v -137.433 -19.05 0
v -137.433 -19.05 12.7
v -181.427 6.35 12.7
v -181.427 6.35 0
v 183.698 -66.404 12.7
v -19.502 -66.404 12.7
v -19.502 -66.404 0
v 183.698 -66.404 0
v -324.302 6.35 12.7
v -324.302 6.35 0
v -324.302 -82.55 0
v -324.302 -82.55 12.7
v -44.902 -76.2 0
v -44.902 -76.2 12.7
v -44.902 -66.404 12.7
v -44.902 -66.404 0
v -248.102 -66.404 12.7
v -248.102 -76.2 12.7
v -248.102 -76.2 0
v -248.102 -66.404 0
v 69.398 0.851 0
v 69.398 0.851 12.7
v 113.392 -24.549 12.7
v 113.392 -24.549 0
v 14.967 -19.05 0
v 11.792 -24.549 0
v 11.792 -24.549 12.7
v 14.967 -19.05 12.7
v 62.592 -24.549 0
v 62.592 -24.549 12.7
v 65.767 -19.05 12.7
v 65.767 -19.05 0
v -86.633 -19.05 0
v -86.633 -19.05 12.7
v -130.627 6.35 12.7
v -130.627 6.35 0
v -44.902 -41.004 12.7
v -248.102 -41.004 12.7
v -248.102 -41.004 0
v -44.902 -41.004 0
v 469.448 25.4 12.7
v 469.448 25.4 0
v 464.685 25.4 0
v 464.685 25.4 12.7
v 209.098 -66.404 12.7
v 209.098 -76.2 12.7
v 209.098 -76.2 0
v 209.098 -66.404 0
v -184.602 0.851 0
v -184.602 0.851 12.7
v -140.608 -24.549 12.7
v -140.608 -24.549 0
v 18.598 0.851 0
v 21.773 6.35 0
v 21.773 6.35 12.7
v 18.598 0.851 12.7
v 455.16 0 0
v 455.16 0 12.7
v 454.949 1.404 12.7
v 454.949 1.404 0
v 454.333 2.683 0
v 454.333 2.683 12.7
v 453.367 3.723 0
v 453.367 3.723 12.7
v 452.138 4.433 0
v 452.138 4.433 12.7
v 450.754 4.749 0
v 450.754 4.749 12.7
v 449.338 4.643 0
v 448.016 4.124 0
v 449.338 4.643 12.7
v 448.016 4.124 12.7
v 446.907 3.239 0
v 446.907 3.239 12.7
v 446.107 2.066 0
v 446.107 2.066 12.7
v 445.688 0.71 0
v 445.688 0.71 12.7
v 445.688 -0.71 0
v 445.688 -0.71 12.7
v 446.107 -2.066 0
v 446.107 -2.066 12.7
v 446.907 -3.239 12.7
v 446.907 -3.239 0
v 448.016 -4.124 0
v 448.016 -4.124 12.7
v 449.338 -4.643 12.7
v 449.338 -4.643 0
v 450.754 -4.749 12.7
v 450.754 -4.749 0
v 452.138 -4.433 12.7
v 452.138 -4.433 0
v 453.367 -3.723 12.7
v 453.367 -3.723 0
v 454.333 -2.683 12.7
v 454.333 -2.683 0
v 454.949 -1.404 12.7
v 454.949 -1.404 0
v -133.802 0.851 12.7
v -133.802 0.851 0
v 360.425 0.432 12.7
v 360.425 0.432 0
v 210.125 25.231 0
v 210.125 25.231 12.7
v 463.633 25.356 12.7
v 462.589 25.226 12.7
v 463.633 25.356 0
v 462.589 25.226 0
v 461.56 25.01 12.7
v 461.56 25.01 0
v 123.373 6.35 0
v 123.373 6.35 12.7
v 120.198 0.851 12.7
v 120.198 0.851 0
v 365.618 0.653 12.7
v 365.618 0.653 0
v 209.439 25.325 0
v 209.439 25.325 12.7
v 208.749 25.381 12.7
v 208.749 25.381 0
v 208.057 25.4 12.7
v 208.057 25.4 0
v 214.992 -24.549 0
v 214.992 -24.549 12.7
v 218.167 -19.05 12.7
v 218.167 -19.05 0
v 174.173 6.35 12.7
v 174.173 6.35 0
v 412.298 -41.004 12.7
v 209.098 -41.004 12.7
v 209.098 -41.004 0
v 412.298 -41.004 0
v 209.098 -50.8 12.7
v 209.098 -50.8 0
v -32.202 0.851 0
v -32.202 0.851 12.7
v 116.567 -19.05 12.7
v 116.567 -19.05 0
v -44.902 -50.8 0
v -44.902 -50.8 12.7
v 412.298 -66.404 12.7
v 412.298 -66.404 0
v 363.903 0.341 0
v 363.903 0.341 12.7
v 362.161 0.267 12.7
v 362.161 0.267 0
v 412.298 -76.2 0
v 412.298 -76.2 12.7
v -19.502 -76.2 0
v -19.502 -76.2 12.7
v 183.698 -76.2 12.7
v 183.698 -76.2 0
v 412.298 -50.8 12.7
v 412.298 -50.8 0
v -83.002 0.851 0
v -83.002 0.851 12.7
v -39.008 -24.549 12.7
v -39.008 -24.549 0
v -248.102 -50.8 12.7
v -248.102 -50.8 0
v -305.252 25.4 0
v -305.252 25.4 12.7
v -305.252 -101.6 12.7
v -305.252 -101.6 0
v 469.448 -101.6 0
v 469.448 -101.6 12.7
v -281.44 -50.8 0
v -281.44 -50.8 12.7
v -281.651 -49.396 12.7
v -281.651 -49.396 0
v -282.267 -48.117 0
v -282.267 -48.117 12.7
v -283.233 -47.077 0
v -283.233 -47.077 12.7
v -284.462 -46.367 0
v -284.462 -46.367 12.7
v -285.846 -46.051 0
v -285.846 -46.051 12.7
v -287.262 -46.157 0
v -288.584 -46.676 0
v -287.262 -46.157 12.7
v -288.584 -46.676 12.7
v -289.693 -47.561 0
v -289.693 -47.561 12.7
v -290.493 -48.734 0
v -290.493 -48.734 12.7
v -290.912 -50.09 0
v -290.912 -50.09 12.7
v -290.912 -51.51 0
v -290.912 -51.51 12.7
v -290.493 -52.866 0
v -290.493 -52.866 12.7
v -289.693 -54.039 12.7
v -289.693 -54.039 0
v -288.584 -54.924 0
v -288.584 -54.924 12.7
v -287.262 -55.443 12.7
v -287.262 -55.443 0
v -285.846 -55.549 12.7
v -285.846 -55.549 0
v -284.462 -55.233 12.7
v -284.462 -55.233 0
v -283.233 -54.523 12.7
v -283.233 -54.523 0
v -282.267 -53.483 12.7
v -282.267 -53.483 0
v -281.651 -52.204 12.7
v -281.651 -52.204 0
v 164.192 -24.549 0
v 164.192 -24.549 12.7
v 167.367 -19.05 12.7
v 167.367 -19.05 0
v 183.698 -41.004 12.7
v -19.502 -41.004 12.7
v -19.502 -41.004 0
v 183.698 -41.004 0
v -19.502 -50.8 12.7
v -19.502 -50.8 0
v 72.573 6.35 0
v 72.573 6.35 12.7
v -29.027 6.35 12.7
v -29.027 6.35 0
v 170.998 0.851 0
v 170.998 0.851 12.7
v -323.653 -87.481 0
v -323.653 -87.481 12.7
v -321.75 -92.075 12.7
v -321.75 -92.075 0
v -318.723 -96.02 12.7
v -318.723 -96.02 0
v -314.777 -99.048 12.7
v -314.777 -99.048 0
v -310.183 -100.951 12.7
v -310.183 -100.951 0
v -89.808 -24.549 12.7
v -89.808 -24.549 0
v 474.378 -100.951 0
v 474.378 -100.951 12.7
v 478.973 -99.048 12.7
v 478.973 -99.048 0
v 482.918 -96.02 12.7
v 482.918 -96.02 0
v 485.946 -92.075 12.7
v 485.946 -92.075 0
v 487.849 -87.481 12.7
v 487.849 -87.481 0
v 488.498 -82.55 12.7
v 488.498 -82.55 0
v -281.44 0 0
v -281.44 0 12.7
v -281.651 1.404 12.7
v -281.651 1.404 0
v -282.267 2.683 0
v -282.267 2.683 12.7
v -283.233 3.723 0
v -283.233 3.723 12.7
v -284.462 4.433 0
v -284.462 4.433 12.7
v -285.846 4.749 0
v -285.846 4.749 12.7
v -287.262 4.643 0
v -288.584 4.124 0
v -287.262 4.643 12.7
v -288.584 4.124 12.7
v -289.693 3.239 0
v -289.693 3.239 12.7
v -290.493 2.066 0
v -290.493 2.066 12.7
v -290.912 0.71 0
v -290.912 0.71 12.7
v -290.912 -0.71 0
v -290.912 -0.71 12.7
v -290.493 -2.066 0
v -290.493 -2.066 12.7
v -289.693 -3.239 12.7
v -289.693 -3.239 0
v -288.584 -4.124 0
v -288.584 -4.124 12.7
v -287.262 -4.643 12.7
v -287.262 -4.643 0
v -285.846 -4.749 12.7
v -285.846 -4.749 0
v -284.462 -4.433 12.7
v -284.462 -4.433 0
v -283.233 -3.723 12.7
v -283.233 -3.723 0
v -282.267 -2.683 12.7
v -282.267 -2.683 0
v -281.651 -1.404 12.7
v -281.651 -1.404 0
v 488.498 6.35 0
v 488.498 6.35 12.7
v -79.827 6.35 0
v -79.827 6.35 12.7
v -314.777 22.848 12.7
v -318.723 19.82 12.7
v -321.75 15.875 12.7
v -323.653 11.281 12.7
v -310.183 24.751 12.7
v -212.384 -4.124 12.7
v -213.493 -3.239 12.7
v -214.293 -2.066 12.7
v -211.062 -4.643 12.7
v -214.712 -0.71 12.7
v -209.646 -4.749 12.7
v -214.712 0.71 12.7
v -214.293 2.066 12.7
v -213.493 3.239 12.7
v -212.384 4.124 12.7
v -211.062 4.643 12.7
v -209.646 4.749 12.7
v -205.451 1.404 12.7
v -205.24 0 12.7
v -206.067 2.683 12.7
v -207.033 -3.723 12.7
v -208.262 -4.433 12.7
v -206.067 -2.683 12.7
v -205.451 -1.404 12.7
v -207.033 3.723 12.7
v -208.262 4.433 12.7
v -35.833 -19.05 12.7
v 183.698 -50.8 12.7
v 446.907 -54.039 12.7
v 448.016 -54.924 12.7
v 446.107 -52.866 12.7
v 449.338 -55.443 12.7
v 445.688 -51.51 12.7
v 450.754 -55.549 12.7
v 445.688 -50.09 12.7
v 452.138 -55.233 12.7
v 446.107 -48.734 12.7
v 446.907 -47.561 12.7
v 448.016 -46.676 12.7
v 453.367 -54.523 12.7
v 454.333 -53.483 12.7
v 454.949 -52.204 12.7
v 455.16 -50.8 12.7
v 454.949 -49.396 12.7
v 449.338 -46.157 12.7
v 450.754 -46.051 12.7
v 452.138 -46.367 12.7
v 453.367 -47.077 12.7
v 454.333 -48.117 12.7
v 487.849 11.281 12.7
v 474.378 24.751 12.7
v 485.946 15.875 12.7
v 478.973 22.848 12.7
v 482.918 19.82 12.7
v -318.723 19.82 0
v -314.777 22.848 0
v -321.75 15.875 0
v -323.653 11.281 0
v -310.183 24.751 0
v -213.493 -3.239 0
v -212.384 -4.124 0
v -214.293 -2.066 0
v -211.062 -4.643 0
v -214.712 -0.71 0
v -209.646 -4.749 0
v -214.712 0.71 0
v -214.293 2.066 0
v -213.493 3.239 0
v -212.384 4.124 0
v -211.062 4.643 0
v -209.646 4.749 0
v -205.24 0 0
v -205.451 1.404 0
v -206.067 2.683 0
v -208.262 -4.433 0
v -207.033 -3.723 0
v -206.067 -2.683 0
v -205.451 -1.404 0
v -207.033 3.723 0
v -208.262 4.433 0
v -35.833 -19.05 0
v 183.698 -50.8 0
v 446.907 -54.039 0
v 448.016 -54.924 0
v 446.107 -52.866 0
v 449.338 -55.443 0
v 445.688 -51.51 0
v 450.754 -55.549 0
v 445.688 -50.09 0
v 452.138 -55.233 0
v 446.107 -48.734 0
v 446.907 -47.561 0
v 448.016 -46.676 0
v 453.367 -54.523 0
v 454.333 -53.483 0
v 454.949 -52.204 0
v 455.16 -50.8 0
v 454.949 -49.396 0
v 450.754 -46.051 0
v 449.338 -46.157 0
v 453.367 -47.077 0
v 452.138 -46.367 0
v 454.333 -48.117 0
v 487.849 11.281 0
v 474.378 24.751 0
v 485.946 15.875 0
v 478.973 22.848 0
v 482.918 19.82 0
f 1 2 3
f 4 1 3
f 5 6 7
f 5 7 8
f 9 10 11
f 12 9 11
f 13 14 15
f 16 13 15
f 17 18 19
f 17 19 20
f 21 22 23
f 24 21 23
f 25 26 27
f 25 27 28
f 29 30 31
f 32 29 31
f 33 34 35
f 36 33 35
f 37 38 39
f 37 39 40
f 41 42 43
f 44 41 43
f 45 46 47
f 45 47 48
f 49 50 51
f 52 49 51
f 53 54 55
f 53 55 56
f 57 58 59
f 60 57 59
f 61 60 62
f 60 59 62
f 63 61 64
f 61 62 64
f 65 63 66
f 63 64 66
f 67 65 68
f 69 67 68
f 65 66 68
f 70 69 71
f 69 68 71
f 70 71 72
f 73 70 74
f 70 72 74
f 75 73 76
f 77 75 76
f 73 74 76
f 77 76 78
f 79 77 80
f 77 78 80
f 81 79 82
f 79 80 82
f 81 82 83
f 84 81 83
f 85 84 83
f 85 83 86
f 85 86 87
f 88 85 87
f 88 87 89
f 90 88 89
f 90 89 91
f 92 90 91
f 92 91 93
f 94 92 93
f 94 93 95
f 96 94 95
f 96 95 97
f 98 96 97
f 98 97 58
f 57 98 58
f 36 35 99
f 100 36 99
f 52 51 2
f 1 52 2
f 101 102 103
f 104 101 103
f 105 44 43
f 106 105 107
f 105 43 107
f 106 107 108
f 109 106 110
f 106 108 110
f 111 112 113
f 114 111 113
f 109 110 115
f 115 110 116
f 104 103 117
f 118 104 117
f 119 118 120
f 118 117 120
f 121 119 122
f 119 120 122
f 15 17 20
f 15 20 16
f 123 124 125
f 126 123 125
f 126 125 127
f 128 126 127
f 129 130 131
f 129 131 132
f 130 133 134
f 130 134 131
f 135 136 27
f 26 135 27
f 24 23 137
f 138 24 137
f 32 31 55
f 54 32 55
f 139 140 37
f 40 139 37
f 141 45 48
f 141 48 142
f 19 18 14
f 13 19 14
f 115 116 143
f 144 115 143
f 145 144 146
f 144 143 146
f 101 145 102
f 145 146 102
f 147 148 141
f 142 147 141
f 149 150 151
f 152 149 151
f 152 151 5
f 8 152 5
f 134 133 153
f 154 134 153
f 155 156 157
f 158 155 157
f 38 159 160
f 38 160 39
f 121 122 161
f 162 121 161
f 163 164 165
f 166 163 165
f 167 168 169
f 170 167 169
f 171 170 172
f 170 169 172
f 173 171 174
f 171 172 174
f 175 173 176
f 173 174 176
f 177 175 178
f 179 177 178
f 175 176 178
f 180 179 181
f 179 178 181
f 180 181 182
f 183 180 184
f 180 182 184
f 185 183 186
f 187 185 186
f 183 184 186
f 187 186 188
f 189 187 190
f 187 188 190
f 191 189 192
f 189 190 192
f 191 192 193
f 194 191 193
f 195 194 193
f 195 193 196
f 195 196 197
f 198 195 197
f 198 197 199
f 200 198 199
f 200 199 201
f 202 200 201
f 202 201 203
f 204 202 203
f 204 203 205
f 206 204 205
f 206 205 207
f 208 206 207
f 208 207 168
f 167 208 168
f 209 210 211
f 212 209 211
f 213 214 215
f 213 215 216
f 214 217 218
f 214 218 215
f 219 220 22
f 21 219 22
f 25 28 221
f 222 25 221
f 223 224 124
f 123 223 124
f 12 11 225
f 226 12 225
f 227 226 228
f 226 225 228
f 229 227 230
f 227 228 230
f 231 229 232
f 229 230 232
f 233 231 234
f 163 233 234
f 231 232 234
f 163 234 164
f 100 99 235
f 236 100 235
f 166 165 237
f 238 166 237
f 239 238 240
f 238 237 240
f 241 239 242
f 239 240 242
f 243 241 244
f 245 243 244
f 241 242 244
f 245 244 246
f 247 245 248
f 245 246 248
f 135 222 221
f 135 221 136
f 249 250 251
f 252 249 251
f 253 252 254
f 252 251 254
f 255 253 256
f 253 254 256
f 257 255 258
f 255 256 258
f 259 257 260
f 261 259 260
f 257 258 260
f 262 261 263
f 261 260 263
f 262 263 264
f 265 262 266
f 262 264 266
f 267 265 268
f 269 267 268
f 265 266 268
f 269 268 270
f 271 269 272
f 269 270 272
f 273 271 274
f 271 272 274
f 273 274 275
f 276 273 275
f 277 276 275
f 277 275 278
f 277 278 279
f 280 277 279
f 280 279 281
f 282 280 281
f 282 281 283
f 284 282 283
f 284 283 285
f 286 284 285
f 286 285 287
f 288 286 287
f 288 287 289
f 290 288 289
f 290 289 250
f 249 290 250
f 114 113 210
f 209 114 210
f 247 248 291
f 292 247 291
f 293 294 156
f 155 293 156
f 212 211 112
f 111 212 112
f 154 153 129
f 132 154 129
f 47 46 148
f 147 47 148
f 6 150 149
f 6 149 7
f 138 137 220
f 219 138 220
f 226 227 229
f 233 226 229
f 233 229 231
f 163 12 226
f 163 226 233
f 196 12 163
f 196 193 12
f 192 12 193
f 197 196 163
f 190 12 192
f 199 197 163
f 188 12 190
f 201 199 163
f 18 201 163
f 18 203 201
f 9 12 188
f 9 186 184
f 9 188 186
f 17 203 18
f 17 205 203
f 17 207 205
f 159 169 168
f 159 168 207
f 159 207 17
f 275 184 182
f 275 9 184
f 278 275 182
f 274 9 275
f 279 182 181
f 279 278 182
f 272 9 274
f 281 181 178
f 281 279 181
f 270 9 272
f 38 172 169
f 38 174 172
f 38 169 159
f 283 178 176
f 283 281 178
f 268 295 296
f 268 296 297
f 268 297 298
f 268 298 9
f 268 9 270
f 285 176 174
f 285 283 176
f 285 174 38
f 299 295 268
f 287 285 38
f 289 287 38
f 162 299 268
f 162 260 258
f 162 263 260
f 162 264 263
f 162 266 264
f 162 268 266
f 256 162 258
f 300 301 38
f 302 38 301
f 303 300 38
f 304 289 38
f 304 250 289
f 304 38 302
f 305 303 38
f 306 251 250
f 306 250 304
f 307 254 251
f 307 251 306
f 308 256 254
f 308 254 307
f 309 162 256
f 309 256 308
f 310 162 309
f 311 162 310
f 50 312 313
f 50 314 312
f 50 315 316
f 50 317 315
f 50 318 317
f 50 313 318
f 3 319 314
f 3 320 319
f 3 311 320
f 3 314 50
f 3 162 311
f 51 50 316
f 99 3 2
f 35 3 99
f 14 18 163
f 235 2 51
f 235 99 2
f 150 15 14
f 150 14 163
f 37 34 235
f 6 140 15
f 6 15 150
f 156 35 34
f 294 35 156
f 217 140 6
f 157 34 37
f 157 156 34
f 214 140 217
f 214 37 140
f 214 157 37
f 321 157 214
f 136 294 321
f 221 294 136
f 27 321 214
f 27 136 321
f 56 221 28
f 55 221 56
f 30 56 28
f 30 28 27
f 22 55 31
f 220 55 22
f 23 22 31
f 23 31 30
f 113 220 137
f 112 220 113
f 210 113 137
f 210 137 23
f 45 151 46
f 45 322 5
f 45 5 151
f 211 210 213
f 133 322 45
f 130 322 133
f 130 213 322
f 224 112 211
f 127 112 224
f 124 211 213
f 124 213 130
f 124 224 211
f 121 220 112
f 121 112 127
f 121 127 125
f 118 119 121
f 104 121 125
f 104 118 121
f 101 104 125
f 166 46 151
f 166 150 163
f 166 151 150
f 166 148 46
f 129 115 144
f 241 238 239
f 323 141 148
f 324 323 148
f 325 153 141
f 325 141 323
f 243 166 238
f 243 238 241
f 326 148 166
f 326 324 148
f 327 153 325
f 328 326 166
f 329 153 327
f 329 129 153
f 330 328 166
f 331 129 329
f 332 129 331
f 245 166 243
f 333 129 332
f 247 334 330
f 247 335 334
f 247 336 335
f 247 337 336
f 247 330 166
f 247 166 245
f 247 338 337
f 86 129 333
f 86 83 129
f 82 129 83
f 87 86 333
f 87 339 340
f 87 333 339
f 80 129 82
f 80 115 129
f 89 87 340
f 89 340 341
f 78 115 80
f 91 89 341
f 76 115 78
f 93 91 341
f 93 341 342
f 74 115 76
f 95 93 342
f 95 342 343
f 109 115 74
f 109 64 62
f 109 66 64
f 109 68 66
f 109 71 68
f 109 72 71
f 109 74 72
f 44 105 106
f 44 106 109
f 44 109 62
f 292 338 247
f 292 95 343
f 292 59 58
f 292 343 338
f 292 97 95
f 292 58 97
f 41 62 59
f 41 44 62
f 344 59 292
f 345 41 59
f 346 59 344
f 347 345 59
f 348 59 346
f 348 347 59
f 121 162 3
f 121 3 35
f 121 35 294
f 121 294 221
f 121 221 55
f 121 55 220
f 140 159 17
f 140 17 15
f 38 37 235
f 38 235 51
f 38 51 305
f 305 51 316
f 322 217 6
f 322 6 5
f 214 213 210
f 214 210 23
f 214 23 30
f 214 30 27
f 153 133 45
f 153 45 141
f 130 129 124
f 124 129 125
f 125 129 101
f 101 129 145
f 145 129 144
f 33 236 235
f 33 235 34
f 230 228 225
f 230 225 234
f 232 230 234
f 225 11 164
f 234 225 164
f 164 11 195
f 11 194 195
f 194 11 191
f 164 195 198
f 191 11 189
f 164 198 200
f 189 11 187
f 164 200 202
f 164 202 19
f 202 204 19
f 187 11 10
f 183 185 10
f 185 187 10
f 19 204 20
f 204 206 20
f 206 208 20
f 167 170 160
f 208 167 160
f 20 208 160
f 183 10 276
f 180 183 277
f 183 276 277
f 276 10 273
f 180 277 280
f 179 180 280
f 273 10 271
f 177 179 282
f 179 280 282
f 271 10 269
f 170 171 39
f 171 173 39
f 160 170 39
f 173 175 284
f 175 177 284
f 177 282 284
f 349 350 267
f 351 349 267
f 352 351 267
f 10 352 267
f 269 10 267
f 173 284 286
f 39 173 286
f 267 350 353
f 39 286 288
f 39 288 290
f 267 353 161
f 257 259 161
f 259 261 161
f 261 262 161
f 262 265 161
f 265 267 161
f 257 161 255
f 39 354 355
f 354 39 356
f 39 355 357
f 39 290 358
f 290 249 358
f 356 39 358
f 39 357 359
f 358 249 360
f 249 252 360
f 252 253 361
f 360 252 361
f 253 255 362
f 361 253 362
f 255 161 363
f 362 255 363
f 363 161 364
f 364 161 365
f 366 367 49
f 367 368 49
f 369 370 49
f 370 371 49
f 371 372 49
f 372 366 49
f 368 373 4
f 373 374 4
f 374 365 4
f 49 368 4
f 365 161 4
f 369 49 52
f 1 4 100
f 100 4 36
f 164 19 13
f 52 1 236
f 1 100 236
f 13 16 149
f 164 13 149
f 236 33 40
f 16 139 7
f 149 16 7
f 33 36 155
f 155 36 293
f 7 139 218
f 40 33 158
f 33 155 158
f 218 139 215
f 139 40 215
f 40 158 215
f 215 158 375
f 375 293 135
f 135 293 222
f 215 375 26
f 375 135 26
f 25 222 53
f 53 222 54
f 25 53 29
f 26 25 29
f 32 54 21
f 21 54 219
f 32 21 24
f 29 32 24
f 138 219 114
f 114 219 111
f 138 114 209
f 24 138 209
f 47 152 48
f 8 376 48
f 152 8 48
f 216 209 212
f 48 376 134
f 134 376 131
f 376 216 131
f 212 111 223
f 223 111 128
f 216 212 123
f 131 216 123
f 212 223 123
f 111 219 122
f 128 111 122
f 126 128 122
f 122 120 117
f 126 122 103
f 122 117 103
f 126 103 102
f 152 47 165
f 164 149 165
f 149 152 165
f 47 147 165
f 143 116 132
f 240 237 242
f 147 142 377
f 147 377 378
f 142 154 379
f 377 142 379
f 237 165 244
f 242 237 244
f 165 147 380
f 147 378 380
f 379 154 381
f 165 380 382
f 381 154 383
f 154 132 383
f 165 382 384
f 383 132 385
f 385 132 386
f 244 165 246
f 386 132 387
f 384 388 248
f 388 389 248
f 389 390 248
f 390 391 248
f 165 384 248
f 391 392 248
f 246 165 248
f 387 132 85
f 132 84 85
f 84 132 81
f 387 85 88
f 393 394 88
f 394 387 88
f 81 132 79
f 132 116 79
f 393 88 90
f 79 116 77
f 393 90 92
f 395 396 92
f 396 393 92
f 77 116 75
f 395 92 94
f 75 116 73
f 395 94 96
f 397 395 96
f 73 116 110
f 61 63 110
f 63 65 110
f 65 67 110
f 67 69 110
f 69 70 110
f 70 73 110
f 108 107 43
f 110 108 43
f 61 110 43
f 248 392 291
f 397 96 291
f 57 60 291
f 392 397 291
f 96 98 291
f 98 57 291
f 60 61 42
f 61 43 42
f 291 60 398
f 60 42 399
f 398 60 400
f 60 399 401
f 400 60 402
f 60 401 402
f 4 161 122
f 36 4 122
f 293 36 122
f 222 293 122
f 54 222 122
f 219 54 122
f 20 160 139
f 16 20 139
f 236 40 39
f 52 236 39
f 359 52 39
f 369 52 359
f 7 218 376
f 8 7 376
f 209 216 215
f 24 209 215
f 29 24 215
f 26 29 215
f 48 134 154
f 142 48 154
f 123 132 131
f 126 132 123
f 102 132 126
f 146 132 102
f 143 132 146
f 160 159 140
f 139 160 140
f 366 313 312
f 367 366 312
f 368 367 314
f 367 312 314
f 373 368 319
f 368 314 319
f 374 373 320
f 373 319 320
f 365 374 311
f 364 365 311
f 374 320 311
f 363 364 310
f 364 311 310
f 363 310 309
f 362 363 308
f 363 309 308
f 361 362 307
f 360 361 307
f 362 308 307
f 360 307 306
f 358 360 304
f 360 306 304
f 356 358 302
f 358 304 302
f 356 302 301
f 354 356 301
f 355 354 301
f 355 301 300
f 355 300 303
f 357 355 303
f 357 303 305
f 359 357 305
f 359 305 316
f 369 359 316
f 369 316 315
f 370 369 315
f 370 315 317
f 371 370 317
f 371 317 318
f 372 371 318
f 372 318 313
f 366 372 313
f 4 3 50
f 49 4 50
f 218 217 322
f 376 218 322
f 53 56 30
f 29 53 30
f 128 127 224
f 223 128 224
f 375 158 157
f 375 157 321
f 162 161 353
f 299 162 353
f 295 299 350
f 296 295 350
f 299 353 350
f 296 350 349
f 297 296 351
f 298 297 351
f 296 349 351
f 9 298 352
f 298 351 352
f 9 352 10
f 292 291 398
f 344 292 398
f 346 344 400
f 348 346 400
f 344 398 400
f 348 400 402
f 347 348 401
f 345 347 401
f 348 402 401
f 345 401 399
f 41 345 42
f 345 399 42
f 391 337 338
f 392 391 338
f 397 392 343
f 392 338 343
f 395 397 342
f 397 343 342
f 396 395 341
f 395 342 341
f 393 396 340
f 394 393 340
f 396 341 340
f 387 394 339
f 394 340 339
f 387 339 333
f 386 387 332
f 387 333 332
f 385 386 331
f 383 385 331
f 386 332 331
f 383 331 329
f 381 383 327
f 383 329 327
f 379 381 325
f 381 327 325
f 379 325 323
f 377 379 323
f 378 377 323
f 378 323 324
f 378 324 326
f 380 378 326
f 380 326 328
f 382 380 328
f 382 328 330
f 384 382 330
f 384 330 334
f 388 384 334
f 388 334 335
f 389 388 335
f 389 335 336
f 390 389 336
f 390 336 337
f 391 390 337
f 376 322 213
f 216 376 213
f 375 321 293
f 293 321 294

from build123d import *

# Parameters (mm, degrees)
F1_DEPTH = 12.7
F2_R     = 4.7625
F3_DEPTH = 12.701
F4_W     = 203.2
F4_H     = 9.79558
F5_DEPTH = 12.701
F7_DEPTH = 12.701


with BuildPart() as f1:
    # F0 (on Top) → F1 (new body)
    with BuildSketch(Plane.XY):
        with BuildLine():
            Line((208.057067, 25.4), (-305.252269, 25.4))
            ThreePointArc((-305.252269, 25.4), (-318.722653, 19.820384), (-324.302269, 6.35))
            Line((-324.302269, 6.35), (-324.302269, -82.55))
            ThreePointArc((-324.302269, -82.55), (-318.722653, -96.020384), (-305.252269, -101.6))
            Line((-305.252269, -101.6), (469.447731, -101.6))
            ThreePointArc((469.447731, -101.6), (482.918115, -96.020384), (488.497731, -82.55))
            Line((488.497731, -82.55), (488.497731, 6.35))
            ThreePointArc((488.497731, 6.35), (482.918115, 19.820384), (469.447731, 25.4))
            Line((469.447731, 25.4), (464.684607, 25.4))
            ThreePointArc((464.684607, 25.4), (463.109975, 25.302005), (461.559644, 25.009533))
            Line((461.559644, 25.009533), (365.61775, 0.653221))
            ThreePointArc((365.61775, 0.653221), (363.032974, 0.274247), (360.425341, 0.432165))
            Line((360.425341, 0.432165), (210.124513, 25.230589))
            ThreePointArc((210.124513, 25.230589), (209.094255, 25.357576), (208.057067, 25.4))
        make_face()
    extrude(amount=F1_DEPTH)

    # F2 (on face) → F3 (cut, through all)
    with BuildSketch(Plane.XY.offset(12.7)):
        with Locations((-286.202269, 0)):
            Circle(F2_R)
        with Locations((-286.202269, -50.8)):
            Circle(F2_R)
        with Locations((-210.002269, 0)):
            Circle(F2_R)
        with Locations((450.397731, 0)):
            Circle(F2_R)
        with Locations((450.397731, -50.8)):
            Circle(F2_R)
    extrude(amount=-F3_DEPTH, mode=Mode.SUBTRACT)

    # F4 (on face) → F5 (cut, through all)
    with BuildSketch(Plane.XY.offset(12.7)):
        with Locations((310.697731, -71.30221)):
            Rectangle(F4_W, F4_H)
        with Locations((310.697731, -45.90221)):
            Rectangle(F4_W, F4_H)
        with Locations((82.097731, -45.90221)):
            Rectangle(F4_W, F4_H)
        with Locations((82.097731, -71.30221)):
            Rectangle(F4_W, F4_H)
        with Locations((-146.502269, -71.30221)):
            Rectangle(F4_W, F4_H)
        with Locations((-146.502269, -45.90221)):
            Rectangle(F4_W, F4_H)
    extrude(amount=-F5_DEPTH, mode=Mode.SUBTRACT)

    # F6 (on face) → F7 (cut, through all)
    with BuildSketch(Plane.XY.offset(12.7)):
        Polygon((-137.433179, -19.05), (-181.427269, 6.35), (-184.602269, 0.850739), (-140.608179, -24.549261), align=None)
        Polygon((-86.633179, -19.05), (-130.627269, 6.35), (-133.802269, 0.850739), (-89.808179, -24.549261), align=None)
        Polygon((-35.833179, -19.05), (-79.827269, 6.35), (-83.002269, 0.850739), (-39.008179, -24.549261), align=None)
        Polygon((14.966821, -19.05), (-29.027269, 6.35), (-32.202269, 0.850739), (11.791821, -24.549261), align=None)
        Polygon((65.766821, -19.05), (21.772731, 6.35), (18.597731, 0.850739), (62.591821, -24.549261), align=None)
        Polygon((116.566821, -19.05), (72.572731, 6.35), (69.397731, 0.850739), (113.391821, -24.549261), align=None)
        Polygon((167.366821, -19.05), (123.372731, 6.35), (120.197731, 0.850739), (164.191821, -24.549261), align=None)
        Polygon((218.166821, -19.05), (174.172731, 6.35), (170.997731, 0.850739), (214.991821, -24.549261), align=None)
    extrude(amount=-F7_DEPTH, mode=Mode.SUBTRACT)


solid = f1.part
